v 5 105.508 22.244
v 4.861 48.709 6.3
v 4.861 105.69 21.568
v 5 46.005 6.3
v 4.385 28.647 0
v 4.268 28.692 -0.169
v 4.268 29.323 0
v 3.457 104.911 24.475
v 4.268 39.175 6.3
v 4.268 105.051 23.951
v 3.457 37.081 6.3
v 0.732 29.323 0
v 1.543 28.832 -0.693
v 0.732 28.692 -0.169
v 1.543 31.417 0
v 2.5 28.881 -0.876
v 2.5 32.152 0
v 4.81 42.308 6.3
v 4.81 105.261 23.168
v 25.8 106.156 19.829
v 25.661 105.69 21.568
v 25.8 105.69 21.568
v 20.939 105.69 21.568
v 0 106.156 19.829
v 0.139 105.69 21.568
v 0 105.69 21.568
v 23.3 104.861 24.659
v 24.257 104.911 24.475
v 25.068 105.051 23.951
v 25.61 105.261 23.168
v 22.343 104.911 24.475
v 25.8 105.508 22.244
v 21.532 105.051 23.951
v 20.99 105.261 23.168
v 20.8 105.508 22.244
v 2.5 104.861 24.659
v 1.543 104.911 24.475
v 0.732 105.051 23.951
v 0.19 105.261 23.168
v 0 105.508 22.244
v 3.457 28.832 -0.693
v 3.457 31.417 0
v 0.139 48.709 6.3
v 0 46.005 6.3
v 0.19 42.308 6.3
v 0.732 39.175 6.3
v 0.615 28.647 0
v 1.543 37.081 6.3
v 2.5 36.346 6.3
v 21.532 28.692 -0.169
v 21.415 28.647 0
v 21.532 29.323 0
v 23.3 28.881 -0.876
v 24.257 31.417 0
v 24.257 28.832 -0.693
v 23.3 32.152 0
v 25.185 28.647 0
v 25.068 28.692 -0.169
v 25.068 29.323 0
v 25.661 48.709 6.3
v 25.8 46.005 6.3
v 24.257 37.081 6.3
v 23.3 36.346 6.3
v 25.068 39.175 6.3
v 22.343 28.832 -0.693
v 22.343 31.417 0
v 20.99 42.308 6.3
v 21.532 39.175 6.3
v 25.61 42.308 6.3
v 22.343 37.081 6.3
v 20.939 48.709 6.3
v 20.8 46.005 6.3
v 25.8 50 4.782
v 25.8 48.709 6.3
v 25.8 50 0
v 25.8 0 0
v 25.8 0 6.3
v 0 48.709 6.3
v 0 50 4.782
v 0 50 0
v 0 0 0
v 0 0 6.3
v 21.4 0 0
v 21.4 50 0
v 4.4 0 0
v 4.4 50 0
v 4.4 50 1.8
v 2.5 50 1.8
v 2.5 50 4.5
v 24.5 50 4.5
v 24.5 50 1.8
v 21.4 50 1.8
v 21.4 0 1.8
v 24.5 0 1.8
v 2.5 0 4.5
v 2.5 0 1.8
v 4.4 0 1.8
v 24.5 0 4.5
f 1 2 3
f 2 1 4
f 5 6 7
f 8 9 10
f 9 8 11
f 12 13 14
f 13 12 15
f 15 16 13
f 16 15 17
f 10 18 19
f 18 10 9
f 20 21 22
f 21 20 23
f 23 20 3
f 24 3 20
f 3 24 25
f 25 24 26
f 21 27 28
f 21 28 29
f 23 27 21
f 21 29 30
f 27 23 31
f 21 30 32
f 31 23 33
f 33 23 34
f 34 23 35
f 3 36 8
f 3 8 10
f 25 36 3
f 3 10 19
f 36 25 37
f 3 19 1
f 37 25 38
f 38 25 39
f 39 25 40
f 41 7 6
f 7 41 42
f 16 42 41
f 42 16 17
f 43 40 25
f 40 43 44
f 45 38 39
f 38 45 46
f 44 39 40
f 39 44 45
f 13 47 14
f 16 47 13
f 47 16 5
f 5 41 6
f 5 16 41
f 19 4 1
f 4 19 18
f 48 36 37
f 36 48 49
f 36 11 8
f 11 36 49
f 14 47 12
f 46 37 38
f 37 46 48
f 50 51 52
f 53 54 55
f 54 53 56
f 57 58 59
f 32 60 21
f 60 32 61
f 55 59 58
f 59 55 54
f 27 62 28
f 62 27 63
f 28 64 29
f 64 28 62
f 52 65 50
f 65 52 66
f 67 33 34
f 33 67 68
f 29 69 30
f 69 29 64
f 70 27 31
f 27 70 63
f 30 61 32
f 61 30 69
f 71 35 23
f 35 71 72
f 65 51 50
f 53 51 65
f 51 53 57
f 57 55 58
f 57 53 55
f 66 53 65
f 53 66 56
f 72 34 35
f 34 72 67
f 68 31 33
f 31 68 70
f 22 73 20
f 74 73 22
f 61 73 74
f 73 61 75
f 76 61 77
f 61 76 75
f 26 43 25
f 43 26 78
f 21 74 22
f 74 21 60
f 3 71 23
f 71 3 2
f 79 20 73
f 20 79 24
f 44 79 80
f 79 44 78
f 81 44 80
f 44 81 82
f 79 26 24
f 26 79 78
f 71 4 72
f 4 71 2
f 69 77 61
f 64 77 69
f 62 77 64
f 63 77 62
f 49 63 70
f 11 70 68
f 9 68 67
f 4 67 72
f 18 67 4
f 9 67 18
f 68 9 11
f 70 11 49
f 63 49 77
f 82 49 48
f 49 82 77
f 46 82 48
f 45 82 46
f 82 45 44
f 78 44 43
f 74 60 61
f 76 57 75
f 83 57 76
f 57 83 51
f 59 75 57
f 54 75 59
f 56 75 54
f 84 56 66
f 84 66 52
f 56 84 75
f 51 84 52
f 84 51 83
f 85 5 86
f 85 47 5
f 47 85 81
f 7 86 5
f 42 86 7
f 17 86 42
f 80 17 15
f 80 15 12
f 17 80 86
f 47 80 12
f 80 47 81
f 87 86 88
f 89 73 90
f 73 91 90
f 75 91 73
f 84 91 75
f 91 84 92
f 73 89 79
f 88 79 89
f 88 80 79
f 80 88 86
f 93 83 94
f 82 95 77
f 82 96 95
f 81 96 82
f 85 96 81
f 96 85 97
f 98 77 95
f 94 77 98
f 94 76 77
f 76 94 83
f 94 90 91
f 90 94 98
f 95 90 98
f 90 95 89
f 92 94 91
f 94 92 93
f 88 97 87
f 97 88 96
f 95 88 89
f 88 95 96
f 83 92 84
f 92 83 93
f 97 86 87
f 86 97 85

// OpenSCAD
// -*- mode: SCAD ; c-file-style: "ellemtel" ; coding: utf-8 -*-
//
// NN
//
// © 2018–2019 Roland Sieker <ospalh@gmail.com>
// Licence: CC-BY-SA 4.0

/* [Global] */

// … to preview. You will get all parts as separate STLs when you click “Create Thing”.
part = "s"; // [s: Set, a: Part A, b: Part B]

// Set this to “render” and click on “Create Thing” when done with the setup.
preview = 1; // [0:render, 1:preview]

/* [Sizes] */

// bla bla
size_x = 17;  // [1:0.1:40]
size_xg = 22;
size_y = 50;
size_z = 2.5;



/* [Hidden] */


// Done with the customizer

// *******************************************************
// Extra parameters. These can be changed reasonably safely.


w = 1.8;  // Wall width
p = 1.2;  // Bottom, top plate hight
c = 0.1;  // Clearance
angle = 60; // Overhangs much below 60° are a problem for me

ox=(size_xg-size_x)/2;
wr= size_xg+2*w+2*c;
hr=size_z+2*w+2*c;;

// *******************************************************
// Some shortcuts. These shouldn’t be changed




module kmirror(maxis=[1, 0, 0])
{
   // Keep *and* mirror an object. Standard is left and right mirroring.
   children();
   mirror(maxis)
   {
      children();
   }
}

tau = 2 * PI;  // π is still wrong. τ = circumference / r

xy_factor = 1/tan(angle);
// To get from a hight to a horizontal width inclined correctly
z_factor = tan(angle);  // The other way around


some_distance = 50;
ms = 0.01;  // Muggeseggele.

// fn for differently sized objects and fs, fa; all for preview or rendering.
pna = 40;
pnb = 15;
pa = 5;
ps = 1;
rna = 180;
rnb = 30;
ra = 2;
rs = 0.25;
function na() = (preview) ? pna : rna;
function nb() = (preview) ? pnb : rnb;
$fs = (preview) ? ps : rs;
$fa = (preview) ? pa : ra;

// *******************************************************
// End setup



// *******************************************************
// Generate the parts

print_part();


if ("s" == part)
{
   preview_parts();
}

if ("st" == part)
{
   // Use "st" during development
   stack_parts();
}

module print_part()
{
   if ("a" == part)
   {
      part_a();
   }
   if ("b" == part)
   {
      part_b();
   }
}

module preview_parts()
{
   part_a();
   translate([some_distance, 0, 0])
   {
      part_b();
   }
}

module stack_parts()
{
   // intersection()
   {
      color("yellow")
      {
         part_a();
      }
      translate([0,0,30])
      {
         color("red")
         {
            part_b();
         }
      }
   }
}

// *******************************************************
// Code for the parts themselves


module part_a()
{
   difference()
   {
      union()
      {
            cube([wr, size_y, hr]);
            translate([0,size_y-w, size_z+w])
         {
            rotate([15,0,0])
               {
                  rotate([-90,0,0])
                  {
                  translate([2.5,-2.5,-20])
                  cylinder(h=80,r=2.5);
                  translate([wr-2.5,-2.5,-20])
                  cylinder(h=80,r=2.5);
}
               cube([wr, 60, w]);
               }
         }
      }
      translate([0,-ms, 0])
      {
         translate([ox, 0, w])
            cube([size_xg, size_y+2*ms, size_z+2*c]);
         translate([ox+w+c,0,-ms])
            cube([size_x,size_y+2*ms,w+2*ms]);
      }
   }
}


module part_b()
{

}
